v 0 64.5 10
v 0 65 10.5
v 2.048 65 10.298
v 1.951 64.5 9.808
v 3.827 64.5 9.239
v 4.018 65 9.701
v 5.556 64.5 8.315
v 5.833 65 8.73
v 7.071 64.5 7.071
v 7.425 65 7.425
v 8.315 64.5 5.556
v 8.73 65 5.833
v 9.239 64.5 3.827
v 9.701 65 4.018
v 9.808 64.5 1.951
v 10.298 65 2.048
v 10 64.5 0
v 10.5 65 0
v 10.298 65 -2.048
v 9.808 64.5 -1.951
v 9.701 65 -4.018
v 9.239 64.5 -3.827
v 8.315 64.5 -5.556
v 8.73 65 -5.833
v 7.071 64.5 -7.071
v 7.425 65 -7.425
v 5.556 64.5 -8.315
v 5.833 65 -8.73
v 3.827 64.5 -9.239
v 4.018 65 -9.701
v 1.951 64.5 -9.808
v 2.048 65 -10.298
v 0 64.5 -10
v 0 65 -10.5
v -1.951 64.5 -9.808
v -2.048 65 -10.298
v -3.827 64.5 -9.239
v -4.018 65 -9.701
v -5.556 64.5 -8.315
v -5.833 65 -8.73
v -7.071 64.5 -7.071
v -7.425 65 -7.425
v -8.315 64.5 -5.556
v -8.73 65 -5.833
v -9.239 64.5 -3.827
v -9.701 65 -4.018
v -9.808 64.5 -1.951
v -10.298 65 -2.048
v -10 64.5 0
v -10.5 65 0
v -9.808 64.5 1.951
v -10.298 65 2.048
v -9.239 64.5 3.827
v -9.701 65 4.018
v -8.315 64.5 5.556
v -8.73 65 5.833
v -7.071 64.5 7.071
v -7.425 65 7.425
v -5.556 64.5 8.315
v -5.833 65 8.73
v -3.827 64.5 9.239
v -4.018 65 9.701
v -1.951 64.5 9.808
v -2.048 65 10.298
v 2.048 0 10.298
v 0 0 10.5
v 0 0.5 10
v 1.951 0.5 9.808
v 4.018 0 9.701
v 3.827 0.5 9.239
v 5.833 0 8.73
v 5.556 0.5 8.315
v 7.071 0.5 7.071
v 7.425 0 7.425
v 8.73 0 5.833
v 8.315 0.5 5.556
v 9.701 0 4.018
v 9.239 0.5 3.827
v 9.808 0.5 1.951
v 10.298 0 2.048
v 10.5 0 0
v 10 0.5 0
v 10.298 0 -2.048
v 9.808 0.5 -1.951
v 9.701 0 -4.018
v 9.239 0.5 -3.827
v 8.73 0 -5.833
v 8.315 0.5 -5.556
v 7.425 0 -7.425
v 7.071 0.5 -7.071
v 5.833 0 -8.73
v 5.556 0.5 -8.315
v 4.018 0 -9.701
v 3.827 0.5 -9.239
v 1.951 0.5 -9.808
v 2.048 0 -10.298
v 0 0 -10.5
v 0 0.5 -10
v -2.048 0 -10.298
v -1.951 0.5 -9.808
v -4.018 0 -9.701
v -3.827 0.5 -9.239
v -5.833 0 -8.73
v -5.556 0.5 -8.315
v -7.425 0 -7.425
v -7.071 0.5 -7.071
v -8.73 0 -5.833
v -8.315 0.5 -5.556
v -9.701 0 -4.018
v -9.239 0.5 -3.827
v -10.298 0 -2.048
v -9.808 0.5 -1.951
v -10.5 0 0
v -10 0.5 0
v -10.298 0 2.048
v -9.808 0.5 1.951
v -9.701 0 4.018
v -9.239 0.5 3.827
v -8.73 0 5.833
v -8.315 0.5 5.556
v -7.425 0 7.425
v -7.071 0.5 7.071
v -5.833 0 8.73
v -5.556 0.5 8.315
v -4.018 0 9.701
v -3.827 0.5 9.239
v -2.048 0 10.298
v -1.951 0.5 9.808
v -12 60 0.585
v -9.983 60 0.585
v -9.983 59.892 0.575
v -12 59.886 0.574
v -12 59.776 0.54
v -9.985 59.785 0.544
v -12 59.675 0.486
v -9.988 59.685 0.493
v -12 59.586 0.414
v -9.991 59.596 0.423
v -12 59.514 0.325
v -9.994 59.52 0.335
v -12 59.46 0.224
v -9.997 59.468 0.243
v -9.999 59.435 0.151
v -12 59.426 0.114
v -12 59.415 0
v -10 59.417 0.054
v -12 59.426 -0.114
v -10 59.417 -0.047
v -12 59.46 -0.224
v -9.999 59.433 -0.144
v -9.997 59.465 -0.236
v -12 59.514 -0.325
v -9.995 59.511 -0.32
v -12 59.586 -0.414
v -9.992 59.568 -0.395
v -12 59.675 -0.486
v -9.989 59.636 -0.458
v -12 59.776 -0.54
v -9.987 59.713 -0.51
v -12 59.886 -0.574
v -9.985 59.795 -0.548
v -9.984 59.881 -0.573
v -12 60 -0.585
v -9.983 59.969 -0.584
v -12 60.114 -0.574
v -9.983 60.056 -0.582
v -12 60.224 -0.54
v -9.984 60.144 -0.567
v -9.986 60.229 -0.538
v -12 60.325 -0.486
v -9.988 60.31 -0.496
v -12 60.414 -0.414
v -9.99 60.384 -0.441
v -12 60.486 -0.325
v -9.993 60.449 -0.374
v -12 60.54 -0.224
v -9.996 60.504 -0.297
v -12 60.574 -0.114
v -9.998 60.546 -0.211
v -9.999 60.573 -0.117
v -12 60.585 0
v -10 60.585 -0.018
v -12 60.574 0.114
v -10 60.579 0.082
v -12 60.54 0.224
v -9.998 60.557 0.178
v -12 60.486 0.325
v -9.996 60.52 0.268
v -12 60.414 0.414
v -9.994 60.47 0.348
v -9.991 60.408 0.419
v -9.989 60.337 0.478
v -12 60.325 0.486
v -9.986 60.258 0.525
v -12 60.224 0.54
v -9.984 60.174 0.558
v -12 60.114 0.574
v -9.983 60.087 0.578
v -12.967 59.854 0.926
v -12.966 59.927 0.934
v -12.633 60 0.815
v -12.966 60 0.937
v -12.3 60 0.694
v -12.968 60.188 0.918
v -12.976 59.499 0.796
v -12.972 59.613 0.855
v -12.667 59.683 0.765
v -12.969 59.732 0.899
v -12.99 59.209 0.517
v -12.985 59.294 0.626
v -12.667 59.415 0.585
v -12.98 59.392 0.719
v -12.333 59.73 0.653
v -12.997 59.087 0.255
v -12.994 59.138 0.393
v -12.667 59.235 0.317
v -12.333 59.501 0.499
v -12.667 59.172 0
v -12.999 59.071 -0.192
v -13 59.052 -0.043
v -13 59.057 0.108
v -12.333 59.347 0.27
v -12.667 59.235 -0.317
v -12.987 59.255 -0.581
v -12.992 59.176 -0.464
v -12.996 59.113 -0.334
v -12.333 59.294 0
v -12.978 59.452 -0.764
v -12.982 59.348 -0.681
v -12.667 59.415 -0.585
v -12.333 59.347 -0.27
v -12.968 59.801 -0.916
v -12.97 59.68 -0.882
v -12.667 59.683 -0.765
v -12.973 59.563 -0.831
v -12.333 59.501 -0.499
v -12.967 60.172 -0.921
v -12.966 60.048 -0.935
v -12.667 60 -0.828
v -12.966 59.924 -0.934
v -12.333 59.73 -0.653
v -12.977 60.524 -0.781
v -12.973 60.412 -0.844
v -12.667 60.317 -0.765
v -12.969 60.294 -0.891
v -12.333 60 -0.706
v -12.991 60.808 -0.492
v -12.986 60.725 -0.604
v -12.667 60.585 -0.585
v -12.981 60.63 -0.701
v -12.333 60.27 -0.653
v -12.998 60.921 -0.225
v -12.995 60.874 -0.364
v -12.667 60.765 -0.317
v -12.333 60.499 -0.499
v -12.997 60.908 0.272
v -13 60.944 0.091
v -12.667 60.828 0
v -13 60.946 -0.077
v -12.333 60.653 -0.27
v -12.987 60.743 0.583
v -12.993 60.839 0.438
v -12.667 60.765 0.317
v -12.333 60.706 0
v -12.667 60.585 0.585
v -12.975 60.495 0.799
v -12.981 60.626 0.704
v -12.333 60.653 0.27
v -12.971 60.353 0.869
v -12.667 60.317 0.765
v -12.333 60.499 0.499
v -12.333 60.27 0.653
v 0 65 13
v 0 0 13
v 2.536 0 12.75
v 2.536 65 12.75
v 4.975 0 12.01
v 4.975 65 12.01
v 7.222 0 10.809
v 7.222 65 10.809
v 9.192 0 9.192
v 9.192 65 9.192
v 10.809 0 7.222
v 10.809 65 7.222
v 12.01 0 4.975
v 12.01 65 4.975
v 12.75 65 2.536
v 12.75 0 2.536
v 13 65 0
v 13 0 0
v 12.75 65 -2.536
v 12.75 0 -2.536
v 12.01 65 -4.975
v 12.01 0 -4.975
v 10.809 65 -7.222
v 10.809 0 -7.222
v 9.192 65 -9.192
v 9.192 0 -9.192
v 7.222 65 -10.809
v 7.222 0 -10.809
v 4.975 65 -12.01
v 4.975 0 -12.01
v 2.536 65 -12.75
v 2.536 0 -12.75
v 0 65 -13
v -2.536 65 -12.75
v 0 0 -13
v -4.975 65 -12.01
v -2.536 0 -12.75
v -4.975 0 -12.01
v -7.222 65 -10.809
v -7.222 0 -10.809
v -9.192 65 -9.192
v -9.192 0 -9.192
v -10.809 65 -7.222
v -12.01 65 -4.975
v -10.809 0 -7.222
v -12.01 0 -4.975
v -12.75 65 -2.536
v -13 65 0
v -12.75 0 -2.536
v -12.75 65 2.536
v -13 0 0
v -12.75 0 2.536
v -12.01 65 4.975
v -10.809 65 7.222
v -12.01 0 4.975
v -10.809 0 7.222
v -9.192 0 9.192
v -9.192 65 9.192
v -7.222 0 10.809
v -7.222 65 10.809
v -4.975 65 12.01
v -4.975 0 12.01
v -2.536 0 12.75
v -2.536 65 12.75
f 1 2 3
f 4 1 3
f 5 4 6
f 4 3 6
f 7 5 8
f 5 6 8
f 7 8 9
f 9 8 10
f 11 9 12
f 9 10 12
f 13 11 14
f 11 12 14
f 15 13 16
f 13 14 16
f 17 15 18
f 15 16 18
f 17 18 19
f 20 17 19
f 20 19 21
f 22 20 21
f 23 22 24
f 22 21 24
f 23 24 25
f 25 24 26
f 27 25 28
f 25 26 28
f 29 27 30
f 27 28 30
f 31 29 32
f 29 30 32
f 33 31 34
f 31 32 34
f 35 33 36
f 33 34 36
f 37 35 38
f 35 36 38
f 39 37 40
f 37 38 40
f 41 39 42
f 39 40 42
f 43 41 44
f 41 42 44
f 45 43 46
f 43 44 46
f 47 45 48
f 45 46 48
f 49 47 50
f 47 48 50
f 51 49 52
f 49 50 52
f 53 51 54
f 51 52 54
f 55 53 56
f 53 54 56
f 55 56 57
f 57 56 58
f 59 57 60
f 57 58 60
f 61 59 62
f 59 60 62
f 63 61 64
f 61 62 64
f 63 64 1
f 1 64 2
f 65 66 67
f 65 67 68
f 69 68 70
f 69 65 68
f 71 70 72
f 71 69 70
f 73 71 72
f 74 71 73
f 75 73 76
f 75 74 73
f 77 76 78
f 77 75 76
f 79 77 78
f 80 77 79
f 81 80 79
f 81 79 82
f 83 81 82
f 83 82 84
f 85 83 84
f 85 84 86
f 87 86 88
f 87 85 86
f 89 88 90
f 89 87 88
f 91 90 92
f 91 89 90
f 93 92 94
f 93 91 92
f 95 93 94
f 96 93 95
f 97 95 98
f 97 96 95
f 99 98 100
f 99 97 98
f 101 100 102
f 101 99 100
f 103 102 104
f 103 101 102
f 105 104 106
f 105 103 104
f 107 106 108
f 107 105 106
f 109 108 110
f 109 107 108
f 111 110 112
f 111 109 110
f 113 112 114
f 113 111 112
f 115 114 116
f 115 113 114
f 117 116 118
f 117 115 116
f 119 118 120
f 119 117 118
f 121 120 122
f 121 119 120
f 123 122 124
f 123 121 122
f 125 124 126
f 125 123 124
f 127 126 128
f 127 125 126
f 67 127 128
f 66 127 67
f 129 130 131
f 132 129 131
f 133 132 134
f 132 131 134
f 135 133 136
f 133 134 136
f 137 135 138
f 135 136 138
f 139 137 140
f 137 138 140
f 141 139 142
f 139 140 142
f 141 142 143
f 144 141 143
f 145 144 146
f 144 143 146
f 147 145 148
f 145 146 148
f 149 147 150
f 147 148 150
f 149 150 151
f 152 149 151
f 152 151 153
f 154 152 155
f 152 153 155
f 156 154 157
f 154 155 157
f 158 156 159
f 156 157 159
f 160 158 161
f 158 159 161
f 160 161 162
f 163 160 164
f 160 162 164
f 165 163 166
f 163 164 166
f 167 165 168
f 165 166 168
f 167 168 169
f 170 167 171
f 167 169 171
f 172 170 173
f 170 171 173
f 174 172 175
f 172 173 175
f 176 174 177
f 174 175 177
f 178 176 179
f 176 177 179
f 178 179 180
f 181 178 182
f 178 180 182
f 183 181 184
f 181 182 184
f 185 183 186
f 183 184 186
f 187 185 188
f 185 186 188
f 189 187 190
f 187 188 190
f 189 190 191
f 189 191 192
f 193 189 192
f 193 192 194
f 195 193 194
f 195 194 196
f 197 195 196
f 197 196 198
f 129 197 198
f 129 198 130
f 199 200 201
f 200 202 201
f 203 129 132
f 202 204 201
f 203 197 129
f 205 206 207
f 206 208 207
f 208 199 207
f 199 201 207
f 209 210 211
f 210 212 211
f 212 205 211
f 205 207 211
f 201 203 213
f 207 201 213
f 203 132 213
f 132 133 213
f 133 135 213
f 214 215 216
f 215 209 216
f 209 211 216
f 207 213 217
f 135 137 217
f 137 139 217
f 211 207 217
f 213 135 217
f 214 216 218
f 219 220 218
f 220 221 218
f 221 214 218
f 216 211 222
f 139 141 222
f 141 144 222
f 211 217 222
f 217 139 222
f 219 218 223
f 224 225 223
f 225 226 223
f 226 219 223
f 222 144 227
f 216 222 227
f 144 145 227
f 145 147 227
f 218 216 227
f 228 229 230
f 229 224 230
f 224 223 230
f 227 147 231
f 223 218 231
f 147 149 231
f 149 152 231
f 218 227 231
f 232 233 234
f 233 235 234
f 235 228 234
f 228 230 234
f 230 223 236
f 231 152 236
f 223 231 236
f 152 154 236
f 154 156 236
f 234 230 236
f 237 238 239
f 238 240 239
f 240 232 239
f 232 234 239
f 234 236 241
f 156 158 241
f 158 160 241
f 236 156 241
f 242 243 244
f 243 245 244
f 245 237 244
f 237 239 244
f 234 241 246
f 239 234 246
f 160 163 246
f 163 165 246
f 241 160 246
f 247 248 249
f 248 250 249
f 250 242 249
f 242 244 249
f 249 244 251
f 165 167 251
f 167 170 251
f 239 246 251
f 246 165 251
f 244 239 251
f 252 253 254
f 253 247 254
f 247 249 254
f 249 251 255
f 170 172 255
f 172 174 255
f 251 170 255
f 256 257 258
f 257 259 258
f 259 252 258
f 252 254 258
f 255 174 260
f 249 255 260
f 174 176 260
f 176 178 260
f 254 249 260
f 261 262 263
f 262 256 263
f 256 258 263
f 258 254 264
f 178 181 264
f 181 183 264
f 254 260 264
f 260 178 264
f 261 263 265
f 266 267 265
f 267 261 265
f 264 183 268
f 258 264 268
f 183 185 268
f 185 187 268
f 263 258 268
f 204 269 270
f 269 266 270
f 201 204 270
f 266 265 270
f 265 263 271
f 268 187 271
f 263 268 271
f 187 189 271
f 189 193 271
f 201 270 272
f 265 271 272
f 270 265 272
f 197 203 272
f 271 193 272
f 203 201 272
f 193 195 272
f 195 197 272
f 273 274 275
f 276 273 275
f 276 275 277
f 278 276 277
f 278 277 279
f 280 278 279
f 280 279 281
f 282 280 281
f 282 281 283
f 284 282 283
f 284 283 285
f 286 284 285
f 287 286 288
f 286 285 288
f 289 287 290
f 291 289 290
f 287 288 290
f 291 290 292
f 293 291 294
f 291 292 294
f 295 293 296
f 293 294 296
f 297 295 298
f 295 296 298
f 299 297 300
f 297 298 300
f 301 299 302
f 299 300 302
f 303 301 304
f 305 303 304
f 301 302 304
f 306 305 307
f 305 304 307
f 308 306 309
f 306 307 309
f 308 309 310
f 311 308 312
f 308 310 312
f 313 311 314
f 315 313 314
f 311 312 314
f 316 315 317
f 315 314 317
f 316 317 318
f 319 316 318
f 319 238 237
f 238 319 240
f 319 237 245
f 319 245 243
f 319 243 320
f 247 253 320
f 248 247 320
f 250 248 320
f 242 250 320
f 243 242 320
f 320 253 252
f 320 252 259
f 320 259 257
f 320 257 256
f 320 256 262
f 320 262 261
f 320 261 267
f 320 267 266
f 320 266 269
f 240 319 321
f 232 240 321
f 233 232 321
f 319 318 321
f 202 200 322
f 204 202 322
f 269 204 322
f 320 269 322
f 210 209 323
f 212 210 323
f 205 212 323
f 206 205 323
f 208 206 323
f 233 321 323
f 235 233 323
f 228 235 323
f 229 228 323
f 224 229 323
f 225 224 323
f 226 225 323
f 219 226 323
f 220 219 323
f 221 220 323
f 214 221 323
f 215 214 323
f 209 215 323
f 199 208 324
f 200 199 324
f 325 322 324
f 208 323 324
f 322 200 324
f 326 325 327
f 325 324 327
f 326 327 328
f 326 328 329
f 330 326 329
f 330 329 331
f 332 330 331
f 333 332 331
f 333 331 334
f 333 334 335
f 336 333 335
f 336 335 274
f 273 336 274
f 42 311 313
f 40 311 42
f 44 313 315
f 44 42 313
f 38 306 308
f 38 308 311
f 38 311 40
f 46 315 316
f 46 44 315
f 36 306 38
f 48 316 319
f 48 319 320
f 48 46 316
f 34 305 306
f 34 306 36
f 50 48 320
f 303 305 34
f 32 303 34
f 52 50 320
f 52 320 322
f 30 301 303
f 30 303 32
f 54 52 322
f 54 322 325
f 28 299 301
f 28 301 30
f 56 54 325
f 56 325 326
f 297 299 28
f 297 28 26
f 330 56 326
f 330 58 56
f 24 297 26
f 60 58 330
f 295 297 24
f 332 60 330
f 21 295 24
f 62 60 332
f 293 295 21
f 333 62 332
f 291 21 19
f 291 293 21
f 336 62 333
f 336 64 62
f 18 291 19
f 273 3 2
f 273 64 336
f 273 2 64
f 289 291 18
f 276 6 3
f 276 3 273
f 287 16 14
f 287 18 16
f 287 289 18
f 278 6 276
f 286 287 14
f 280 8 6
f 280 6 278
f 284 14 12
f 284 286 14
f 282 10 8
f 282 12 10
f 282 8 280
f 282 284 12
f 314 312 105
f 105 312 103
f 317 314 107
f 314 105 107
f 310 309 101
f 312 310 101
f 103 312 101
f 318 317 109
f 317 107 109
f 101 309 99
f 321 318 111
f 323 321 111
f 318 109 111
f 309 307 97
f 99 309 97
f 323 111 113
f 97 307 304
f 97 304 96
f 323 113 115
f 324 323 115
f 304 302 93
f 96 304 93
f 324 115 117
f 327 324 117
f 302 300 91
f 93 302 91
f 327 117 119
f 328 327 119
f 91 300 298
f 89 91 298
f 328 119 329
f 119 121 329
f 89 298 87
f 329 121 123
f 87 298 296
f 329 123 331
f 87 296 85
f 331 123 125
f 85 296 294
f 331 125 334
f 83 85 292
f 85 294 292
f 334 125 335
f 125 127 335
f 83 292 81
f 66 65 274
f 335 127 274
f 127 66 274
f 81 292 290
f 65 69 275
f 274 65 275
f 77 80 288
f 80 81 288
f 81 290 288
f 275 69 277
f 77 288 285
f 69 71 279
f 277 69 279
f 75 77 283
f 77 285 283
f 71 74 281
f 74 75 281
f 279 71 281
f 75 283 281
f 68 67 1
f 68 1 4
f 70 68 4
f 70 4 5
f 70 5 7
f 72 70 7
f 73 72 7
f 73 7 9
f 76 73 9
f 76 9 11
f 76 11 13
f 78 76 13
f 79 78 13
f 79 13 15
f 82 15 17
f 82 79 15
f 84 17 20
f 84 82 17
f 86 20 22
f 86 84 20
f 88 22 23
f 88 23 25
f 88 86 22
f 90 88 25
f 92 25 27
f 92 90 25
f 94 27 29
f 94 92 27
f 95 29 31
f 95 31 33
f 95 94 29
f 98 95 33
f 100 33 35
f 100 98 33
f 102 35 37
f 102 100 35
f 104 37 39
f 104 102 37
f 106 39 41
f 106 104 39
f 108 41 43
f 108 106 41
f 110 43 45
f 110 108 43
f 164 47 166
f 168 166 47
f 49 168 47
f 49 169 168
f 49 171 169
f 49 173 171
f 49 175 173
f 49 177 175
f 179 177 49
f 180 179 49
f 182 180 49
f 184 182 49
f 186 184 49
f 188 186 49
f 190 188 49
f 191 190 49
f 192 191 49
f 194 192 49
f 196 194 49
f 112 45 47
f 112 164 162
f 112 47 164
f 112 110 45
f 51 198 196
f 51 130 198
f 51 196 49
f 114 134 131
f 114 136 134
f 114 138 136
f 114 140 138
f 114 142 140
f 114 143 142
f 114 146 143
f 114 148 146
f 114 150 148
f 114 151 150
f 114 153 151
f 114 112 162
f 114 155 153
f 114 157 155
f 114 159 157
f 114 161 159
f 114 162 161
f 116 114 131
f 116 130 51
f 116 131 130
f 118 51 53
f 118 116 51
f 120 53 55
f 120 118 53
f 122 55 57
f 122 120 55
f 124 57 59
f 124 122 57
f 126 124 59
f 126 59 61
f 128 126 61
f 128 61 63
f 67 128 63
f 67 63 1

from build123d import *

# Parameters (mm, degrees)
SKETCH1_R           = 13
SKETCH1_R_2         = 10
BOSS_EXTRUDE1_DEPTH = 65
CHAMFER1_SIZE       = 0.5


with BuildPart() as part:
    # Sketch1 → Boss-Extrude1 (new body)
    with BuildSketch(Plane(origin=(0, 0, 0), x_dir=(1, 0, 0), z_dir=(0, 1, 0))):
        with Locations(Location((0, 0, 0), (0, 0, 270))):
            Circle(SKETCH1_R)
        with Locations(Location((0, 0, 0), (0, 0, 270))):
            Circle(SKETCH1_R_2, mode=Mode.SUBTRACT)
    extrude(amount=BOSS_EXTRUDE1_DEPTH)

    # Chamfer1
    chamfer1_edges = [part.edges().sort_by_distance(p)[0] for p in [
        (0, 0, -10),
        (0, 65, -10),
    ]]
    chamfer(chamfer1_edges, length=CHAMFER1_SIZE)

    # Sketch5 → Cut-Revolve4 (revolve, cut)
    with BuildSketch(Plane.XY, mode=Mode.PRIVATE) as cut_revolve4_sk:
        Polygon((-13, 60.948970234), (-12, 60.585), (-9, 60.585), (-9, 60), (-13, 60), align=None)
    revolve(cut_revolve4_sk.sketch.rotate(Axis((-13, 60, 0), (1, 0, 0)), 90), axis=Axis((-13, 60, 0), (1, 0, 0)), mode=Mode.SUBTRACT)


solid = part.part
